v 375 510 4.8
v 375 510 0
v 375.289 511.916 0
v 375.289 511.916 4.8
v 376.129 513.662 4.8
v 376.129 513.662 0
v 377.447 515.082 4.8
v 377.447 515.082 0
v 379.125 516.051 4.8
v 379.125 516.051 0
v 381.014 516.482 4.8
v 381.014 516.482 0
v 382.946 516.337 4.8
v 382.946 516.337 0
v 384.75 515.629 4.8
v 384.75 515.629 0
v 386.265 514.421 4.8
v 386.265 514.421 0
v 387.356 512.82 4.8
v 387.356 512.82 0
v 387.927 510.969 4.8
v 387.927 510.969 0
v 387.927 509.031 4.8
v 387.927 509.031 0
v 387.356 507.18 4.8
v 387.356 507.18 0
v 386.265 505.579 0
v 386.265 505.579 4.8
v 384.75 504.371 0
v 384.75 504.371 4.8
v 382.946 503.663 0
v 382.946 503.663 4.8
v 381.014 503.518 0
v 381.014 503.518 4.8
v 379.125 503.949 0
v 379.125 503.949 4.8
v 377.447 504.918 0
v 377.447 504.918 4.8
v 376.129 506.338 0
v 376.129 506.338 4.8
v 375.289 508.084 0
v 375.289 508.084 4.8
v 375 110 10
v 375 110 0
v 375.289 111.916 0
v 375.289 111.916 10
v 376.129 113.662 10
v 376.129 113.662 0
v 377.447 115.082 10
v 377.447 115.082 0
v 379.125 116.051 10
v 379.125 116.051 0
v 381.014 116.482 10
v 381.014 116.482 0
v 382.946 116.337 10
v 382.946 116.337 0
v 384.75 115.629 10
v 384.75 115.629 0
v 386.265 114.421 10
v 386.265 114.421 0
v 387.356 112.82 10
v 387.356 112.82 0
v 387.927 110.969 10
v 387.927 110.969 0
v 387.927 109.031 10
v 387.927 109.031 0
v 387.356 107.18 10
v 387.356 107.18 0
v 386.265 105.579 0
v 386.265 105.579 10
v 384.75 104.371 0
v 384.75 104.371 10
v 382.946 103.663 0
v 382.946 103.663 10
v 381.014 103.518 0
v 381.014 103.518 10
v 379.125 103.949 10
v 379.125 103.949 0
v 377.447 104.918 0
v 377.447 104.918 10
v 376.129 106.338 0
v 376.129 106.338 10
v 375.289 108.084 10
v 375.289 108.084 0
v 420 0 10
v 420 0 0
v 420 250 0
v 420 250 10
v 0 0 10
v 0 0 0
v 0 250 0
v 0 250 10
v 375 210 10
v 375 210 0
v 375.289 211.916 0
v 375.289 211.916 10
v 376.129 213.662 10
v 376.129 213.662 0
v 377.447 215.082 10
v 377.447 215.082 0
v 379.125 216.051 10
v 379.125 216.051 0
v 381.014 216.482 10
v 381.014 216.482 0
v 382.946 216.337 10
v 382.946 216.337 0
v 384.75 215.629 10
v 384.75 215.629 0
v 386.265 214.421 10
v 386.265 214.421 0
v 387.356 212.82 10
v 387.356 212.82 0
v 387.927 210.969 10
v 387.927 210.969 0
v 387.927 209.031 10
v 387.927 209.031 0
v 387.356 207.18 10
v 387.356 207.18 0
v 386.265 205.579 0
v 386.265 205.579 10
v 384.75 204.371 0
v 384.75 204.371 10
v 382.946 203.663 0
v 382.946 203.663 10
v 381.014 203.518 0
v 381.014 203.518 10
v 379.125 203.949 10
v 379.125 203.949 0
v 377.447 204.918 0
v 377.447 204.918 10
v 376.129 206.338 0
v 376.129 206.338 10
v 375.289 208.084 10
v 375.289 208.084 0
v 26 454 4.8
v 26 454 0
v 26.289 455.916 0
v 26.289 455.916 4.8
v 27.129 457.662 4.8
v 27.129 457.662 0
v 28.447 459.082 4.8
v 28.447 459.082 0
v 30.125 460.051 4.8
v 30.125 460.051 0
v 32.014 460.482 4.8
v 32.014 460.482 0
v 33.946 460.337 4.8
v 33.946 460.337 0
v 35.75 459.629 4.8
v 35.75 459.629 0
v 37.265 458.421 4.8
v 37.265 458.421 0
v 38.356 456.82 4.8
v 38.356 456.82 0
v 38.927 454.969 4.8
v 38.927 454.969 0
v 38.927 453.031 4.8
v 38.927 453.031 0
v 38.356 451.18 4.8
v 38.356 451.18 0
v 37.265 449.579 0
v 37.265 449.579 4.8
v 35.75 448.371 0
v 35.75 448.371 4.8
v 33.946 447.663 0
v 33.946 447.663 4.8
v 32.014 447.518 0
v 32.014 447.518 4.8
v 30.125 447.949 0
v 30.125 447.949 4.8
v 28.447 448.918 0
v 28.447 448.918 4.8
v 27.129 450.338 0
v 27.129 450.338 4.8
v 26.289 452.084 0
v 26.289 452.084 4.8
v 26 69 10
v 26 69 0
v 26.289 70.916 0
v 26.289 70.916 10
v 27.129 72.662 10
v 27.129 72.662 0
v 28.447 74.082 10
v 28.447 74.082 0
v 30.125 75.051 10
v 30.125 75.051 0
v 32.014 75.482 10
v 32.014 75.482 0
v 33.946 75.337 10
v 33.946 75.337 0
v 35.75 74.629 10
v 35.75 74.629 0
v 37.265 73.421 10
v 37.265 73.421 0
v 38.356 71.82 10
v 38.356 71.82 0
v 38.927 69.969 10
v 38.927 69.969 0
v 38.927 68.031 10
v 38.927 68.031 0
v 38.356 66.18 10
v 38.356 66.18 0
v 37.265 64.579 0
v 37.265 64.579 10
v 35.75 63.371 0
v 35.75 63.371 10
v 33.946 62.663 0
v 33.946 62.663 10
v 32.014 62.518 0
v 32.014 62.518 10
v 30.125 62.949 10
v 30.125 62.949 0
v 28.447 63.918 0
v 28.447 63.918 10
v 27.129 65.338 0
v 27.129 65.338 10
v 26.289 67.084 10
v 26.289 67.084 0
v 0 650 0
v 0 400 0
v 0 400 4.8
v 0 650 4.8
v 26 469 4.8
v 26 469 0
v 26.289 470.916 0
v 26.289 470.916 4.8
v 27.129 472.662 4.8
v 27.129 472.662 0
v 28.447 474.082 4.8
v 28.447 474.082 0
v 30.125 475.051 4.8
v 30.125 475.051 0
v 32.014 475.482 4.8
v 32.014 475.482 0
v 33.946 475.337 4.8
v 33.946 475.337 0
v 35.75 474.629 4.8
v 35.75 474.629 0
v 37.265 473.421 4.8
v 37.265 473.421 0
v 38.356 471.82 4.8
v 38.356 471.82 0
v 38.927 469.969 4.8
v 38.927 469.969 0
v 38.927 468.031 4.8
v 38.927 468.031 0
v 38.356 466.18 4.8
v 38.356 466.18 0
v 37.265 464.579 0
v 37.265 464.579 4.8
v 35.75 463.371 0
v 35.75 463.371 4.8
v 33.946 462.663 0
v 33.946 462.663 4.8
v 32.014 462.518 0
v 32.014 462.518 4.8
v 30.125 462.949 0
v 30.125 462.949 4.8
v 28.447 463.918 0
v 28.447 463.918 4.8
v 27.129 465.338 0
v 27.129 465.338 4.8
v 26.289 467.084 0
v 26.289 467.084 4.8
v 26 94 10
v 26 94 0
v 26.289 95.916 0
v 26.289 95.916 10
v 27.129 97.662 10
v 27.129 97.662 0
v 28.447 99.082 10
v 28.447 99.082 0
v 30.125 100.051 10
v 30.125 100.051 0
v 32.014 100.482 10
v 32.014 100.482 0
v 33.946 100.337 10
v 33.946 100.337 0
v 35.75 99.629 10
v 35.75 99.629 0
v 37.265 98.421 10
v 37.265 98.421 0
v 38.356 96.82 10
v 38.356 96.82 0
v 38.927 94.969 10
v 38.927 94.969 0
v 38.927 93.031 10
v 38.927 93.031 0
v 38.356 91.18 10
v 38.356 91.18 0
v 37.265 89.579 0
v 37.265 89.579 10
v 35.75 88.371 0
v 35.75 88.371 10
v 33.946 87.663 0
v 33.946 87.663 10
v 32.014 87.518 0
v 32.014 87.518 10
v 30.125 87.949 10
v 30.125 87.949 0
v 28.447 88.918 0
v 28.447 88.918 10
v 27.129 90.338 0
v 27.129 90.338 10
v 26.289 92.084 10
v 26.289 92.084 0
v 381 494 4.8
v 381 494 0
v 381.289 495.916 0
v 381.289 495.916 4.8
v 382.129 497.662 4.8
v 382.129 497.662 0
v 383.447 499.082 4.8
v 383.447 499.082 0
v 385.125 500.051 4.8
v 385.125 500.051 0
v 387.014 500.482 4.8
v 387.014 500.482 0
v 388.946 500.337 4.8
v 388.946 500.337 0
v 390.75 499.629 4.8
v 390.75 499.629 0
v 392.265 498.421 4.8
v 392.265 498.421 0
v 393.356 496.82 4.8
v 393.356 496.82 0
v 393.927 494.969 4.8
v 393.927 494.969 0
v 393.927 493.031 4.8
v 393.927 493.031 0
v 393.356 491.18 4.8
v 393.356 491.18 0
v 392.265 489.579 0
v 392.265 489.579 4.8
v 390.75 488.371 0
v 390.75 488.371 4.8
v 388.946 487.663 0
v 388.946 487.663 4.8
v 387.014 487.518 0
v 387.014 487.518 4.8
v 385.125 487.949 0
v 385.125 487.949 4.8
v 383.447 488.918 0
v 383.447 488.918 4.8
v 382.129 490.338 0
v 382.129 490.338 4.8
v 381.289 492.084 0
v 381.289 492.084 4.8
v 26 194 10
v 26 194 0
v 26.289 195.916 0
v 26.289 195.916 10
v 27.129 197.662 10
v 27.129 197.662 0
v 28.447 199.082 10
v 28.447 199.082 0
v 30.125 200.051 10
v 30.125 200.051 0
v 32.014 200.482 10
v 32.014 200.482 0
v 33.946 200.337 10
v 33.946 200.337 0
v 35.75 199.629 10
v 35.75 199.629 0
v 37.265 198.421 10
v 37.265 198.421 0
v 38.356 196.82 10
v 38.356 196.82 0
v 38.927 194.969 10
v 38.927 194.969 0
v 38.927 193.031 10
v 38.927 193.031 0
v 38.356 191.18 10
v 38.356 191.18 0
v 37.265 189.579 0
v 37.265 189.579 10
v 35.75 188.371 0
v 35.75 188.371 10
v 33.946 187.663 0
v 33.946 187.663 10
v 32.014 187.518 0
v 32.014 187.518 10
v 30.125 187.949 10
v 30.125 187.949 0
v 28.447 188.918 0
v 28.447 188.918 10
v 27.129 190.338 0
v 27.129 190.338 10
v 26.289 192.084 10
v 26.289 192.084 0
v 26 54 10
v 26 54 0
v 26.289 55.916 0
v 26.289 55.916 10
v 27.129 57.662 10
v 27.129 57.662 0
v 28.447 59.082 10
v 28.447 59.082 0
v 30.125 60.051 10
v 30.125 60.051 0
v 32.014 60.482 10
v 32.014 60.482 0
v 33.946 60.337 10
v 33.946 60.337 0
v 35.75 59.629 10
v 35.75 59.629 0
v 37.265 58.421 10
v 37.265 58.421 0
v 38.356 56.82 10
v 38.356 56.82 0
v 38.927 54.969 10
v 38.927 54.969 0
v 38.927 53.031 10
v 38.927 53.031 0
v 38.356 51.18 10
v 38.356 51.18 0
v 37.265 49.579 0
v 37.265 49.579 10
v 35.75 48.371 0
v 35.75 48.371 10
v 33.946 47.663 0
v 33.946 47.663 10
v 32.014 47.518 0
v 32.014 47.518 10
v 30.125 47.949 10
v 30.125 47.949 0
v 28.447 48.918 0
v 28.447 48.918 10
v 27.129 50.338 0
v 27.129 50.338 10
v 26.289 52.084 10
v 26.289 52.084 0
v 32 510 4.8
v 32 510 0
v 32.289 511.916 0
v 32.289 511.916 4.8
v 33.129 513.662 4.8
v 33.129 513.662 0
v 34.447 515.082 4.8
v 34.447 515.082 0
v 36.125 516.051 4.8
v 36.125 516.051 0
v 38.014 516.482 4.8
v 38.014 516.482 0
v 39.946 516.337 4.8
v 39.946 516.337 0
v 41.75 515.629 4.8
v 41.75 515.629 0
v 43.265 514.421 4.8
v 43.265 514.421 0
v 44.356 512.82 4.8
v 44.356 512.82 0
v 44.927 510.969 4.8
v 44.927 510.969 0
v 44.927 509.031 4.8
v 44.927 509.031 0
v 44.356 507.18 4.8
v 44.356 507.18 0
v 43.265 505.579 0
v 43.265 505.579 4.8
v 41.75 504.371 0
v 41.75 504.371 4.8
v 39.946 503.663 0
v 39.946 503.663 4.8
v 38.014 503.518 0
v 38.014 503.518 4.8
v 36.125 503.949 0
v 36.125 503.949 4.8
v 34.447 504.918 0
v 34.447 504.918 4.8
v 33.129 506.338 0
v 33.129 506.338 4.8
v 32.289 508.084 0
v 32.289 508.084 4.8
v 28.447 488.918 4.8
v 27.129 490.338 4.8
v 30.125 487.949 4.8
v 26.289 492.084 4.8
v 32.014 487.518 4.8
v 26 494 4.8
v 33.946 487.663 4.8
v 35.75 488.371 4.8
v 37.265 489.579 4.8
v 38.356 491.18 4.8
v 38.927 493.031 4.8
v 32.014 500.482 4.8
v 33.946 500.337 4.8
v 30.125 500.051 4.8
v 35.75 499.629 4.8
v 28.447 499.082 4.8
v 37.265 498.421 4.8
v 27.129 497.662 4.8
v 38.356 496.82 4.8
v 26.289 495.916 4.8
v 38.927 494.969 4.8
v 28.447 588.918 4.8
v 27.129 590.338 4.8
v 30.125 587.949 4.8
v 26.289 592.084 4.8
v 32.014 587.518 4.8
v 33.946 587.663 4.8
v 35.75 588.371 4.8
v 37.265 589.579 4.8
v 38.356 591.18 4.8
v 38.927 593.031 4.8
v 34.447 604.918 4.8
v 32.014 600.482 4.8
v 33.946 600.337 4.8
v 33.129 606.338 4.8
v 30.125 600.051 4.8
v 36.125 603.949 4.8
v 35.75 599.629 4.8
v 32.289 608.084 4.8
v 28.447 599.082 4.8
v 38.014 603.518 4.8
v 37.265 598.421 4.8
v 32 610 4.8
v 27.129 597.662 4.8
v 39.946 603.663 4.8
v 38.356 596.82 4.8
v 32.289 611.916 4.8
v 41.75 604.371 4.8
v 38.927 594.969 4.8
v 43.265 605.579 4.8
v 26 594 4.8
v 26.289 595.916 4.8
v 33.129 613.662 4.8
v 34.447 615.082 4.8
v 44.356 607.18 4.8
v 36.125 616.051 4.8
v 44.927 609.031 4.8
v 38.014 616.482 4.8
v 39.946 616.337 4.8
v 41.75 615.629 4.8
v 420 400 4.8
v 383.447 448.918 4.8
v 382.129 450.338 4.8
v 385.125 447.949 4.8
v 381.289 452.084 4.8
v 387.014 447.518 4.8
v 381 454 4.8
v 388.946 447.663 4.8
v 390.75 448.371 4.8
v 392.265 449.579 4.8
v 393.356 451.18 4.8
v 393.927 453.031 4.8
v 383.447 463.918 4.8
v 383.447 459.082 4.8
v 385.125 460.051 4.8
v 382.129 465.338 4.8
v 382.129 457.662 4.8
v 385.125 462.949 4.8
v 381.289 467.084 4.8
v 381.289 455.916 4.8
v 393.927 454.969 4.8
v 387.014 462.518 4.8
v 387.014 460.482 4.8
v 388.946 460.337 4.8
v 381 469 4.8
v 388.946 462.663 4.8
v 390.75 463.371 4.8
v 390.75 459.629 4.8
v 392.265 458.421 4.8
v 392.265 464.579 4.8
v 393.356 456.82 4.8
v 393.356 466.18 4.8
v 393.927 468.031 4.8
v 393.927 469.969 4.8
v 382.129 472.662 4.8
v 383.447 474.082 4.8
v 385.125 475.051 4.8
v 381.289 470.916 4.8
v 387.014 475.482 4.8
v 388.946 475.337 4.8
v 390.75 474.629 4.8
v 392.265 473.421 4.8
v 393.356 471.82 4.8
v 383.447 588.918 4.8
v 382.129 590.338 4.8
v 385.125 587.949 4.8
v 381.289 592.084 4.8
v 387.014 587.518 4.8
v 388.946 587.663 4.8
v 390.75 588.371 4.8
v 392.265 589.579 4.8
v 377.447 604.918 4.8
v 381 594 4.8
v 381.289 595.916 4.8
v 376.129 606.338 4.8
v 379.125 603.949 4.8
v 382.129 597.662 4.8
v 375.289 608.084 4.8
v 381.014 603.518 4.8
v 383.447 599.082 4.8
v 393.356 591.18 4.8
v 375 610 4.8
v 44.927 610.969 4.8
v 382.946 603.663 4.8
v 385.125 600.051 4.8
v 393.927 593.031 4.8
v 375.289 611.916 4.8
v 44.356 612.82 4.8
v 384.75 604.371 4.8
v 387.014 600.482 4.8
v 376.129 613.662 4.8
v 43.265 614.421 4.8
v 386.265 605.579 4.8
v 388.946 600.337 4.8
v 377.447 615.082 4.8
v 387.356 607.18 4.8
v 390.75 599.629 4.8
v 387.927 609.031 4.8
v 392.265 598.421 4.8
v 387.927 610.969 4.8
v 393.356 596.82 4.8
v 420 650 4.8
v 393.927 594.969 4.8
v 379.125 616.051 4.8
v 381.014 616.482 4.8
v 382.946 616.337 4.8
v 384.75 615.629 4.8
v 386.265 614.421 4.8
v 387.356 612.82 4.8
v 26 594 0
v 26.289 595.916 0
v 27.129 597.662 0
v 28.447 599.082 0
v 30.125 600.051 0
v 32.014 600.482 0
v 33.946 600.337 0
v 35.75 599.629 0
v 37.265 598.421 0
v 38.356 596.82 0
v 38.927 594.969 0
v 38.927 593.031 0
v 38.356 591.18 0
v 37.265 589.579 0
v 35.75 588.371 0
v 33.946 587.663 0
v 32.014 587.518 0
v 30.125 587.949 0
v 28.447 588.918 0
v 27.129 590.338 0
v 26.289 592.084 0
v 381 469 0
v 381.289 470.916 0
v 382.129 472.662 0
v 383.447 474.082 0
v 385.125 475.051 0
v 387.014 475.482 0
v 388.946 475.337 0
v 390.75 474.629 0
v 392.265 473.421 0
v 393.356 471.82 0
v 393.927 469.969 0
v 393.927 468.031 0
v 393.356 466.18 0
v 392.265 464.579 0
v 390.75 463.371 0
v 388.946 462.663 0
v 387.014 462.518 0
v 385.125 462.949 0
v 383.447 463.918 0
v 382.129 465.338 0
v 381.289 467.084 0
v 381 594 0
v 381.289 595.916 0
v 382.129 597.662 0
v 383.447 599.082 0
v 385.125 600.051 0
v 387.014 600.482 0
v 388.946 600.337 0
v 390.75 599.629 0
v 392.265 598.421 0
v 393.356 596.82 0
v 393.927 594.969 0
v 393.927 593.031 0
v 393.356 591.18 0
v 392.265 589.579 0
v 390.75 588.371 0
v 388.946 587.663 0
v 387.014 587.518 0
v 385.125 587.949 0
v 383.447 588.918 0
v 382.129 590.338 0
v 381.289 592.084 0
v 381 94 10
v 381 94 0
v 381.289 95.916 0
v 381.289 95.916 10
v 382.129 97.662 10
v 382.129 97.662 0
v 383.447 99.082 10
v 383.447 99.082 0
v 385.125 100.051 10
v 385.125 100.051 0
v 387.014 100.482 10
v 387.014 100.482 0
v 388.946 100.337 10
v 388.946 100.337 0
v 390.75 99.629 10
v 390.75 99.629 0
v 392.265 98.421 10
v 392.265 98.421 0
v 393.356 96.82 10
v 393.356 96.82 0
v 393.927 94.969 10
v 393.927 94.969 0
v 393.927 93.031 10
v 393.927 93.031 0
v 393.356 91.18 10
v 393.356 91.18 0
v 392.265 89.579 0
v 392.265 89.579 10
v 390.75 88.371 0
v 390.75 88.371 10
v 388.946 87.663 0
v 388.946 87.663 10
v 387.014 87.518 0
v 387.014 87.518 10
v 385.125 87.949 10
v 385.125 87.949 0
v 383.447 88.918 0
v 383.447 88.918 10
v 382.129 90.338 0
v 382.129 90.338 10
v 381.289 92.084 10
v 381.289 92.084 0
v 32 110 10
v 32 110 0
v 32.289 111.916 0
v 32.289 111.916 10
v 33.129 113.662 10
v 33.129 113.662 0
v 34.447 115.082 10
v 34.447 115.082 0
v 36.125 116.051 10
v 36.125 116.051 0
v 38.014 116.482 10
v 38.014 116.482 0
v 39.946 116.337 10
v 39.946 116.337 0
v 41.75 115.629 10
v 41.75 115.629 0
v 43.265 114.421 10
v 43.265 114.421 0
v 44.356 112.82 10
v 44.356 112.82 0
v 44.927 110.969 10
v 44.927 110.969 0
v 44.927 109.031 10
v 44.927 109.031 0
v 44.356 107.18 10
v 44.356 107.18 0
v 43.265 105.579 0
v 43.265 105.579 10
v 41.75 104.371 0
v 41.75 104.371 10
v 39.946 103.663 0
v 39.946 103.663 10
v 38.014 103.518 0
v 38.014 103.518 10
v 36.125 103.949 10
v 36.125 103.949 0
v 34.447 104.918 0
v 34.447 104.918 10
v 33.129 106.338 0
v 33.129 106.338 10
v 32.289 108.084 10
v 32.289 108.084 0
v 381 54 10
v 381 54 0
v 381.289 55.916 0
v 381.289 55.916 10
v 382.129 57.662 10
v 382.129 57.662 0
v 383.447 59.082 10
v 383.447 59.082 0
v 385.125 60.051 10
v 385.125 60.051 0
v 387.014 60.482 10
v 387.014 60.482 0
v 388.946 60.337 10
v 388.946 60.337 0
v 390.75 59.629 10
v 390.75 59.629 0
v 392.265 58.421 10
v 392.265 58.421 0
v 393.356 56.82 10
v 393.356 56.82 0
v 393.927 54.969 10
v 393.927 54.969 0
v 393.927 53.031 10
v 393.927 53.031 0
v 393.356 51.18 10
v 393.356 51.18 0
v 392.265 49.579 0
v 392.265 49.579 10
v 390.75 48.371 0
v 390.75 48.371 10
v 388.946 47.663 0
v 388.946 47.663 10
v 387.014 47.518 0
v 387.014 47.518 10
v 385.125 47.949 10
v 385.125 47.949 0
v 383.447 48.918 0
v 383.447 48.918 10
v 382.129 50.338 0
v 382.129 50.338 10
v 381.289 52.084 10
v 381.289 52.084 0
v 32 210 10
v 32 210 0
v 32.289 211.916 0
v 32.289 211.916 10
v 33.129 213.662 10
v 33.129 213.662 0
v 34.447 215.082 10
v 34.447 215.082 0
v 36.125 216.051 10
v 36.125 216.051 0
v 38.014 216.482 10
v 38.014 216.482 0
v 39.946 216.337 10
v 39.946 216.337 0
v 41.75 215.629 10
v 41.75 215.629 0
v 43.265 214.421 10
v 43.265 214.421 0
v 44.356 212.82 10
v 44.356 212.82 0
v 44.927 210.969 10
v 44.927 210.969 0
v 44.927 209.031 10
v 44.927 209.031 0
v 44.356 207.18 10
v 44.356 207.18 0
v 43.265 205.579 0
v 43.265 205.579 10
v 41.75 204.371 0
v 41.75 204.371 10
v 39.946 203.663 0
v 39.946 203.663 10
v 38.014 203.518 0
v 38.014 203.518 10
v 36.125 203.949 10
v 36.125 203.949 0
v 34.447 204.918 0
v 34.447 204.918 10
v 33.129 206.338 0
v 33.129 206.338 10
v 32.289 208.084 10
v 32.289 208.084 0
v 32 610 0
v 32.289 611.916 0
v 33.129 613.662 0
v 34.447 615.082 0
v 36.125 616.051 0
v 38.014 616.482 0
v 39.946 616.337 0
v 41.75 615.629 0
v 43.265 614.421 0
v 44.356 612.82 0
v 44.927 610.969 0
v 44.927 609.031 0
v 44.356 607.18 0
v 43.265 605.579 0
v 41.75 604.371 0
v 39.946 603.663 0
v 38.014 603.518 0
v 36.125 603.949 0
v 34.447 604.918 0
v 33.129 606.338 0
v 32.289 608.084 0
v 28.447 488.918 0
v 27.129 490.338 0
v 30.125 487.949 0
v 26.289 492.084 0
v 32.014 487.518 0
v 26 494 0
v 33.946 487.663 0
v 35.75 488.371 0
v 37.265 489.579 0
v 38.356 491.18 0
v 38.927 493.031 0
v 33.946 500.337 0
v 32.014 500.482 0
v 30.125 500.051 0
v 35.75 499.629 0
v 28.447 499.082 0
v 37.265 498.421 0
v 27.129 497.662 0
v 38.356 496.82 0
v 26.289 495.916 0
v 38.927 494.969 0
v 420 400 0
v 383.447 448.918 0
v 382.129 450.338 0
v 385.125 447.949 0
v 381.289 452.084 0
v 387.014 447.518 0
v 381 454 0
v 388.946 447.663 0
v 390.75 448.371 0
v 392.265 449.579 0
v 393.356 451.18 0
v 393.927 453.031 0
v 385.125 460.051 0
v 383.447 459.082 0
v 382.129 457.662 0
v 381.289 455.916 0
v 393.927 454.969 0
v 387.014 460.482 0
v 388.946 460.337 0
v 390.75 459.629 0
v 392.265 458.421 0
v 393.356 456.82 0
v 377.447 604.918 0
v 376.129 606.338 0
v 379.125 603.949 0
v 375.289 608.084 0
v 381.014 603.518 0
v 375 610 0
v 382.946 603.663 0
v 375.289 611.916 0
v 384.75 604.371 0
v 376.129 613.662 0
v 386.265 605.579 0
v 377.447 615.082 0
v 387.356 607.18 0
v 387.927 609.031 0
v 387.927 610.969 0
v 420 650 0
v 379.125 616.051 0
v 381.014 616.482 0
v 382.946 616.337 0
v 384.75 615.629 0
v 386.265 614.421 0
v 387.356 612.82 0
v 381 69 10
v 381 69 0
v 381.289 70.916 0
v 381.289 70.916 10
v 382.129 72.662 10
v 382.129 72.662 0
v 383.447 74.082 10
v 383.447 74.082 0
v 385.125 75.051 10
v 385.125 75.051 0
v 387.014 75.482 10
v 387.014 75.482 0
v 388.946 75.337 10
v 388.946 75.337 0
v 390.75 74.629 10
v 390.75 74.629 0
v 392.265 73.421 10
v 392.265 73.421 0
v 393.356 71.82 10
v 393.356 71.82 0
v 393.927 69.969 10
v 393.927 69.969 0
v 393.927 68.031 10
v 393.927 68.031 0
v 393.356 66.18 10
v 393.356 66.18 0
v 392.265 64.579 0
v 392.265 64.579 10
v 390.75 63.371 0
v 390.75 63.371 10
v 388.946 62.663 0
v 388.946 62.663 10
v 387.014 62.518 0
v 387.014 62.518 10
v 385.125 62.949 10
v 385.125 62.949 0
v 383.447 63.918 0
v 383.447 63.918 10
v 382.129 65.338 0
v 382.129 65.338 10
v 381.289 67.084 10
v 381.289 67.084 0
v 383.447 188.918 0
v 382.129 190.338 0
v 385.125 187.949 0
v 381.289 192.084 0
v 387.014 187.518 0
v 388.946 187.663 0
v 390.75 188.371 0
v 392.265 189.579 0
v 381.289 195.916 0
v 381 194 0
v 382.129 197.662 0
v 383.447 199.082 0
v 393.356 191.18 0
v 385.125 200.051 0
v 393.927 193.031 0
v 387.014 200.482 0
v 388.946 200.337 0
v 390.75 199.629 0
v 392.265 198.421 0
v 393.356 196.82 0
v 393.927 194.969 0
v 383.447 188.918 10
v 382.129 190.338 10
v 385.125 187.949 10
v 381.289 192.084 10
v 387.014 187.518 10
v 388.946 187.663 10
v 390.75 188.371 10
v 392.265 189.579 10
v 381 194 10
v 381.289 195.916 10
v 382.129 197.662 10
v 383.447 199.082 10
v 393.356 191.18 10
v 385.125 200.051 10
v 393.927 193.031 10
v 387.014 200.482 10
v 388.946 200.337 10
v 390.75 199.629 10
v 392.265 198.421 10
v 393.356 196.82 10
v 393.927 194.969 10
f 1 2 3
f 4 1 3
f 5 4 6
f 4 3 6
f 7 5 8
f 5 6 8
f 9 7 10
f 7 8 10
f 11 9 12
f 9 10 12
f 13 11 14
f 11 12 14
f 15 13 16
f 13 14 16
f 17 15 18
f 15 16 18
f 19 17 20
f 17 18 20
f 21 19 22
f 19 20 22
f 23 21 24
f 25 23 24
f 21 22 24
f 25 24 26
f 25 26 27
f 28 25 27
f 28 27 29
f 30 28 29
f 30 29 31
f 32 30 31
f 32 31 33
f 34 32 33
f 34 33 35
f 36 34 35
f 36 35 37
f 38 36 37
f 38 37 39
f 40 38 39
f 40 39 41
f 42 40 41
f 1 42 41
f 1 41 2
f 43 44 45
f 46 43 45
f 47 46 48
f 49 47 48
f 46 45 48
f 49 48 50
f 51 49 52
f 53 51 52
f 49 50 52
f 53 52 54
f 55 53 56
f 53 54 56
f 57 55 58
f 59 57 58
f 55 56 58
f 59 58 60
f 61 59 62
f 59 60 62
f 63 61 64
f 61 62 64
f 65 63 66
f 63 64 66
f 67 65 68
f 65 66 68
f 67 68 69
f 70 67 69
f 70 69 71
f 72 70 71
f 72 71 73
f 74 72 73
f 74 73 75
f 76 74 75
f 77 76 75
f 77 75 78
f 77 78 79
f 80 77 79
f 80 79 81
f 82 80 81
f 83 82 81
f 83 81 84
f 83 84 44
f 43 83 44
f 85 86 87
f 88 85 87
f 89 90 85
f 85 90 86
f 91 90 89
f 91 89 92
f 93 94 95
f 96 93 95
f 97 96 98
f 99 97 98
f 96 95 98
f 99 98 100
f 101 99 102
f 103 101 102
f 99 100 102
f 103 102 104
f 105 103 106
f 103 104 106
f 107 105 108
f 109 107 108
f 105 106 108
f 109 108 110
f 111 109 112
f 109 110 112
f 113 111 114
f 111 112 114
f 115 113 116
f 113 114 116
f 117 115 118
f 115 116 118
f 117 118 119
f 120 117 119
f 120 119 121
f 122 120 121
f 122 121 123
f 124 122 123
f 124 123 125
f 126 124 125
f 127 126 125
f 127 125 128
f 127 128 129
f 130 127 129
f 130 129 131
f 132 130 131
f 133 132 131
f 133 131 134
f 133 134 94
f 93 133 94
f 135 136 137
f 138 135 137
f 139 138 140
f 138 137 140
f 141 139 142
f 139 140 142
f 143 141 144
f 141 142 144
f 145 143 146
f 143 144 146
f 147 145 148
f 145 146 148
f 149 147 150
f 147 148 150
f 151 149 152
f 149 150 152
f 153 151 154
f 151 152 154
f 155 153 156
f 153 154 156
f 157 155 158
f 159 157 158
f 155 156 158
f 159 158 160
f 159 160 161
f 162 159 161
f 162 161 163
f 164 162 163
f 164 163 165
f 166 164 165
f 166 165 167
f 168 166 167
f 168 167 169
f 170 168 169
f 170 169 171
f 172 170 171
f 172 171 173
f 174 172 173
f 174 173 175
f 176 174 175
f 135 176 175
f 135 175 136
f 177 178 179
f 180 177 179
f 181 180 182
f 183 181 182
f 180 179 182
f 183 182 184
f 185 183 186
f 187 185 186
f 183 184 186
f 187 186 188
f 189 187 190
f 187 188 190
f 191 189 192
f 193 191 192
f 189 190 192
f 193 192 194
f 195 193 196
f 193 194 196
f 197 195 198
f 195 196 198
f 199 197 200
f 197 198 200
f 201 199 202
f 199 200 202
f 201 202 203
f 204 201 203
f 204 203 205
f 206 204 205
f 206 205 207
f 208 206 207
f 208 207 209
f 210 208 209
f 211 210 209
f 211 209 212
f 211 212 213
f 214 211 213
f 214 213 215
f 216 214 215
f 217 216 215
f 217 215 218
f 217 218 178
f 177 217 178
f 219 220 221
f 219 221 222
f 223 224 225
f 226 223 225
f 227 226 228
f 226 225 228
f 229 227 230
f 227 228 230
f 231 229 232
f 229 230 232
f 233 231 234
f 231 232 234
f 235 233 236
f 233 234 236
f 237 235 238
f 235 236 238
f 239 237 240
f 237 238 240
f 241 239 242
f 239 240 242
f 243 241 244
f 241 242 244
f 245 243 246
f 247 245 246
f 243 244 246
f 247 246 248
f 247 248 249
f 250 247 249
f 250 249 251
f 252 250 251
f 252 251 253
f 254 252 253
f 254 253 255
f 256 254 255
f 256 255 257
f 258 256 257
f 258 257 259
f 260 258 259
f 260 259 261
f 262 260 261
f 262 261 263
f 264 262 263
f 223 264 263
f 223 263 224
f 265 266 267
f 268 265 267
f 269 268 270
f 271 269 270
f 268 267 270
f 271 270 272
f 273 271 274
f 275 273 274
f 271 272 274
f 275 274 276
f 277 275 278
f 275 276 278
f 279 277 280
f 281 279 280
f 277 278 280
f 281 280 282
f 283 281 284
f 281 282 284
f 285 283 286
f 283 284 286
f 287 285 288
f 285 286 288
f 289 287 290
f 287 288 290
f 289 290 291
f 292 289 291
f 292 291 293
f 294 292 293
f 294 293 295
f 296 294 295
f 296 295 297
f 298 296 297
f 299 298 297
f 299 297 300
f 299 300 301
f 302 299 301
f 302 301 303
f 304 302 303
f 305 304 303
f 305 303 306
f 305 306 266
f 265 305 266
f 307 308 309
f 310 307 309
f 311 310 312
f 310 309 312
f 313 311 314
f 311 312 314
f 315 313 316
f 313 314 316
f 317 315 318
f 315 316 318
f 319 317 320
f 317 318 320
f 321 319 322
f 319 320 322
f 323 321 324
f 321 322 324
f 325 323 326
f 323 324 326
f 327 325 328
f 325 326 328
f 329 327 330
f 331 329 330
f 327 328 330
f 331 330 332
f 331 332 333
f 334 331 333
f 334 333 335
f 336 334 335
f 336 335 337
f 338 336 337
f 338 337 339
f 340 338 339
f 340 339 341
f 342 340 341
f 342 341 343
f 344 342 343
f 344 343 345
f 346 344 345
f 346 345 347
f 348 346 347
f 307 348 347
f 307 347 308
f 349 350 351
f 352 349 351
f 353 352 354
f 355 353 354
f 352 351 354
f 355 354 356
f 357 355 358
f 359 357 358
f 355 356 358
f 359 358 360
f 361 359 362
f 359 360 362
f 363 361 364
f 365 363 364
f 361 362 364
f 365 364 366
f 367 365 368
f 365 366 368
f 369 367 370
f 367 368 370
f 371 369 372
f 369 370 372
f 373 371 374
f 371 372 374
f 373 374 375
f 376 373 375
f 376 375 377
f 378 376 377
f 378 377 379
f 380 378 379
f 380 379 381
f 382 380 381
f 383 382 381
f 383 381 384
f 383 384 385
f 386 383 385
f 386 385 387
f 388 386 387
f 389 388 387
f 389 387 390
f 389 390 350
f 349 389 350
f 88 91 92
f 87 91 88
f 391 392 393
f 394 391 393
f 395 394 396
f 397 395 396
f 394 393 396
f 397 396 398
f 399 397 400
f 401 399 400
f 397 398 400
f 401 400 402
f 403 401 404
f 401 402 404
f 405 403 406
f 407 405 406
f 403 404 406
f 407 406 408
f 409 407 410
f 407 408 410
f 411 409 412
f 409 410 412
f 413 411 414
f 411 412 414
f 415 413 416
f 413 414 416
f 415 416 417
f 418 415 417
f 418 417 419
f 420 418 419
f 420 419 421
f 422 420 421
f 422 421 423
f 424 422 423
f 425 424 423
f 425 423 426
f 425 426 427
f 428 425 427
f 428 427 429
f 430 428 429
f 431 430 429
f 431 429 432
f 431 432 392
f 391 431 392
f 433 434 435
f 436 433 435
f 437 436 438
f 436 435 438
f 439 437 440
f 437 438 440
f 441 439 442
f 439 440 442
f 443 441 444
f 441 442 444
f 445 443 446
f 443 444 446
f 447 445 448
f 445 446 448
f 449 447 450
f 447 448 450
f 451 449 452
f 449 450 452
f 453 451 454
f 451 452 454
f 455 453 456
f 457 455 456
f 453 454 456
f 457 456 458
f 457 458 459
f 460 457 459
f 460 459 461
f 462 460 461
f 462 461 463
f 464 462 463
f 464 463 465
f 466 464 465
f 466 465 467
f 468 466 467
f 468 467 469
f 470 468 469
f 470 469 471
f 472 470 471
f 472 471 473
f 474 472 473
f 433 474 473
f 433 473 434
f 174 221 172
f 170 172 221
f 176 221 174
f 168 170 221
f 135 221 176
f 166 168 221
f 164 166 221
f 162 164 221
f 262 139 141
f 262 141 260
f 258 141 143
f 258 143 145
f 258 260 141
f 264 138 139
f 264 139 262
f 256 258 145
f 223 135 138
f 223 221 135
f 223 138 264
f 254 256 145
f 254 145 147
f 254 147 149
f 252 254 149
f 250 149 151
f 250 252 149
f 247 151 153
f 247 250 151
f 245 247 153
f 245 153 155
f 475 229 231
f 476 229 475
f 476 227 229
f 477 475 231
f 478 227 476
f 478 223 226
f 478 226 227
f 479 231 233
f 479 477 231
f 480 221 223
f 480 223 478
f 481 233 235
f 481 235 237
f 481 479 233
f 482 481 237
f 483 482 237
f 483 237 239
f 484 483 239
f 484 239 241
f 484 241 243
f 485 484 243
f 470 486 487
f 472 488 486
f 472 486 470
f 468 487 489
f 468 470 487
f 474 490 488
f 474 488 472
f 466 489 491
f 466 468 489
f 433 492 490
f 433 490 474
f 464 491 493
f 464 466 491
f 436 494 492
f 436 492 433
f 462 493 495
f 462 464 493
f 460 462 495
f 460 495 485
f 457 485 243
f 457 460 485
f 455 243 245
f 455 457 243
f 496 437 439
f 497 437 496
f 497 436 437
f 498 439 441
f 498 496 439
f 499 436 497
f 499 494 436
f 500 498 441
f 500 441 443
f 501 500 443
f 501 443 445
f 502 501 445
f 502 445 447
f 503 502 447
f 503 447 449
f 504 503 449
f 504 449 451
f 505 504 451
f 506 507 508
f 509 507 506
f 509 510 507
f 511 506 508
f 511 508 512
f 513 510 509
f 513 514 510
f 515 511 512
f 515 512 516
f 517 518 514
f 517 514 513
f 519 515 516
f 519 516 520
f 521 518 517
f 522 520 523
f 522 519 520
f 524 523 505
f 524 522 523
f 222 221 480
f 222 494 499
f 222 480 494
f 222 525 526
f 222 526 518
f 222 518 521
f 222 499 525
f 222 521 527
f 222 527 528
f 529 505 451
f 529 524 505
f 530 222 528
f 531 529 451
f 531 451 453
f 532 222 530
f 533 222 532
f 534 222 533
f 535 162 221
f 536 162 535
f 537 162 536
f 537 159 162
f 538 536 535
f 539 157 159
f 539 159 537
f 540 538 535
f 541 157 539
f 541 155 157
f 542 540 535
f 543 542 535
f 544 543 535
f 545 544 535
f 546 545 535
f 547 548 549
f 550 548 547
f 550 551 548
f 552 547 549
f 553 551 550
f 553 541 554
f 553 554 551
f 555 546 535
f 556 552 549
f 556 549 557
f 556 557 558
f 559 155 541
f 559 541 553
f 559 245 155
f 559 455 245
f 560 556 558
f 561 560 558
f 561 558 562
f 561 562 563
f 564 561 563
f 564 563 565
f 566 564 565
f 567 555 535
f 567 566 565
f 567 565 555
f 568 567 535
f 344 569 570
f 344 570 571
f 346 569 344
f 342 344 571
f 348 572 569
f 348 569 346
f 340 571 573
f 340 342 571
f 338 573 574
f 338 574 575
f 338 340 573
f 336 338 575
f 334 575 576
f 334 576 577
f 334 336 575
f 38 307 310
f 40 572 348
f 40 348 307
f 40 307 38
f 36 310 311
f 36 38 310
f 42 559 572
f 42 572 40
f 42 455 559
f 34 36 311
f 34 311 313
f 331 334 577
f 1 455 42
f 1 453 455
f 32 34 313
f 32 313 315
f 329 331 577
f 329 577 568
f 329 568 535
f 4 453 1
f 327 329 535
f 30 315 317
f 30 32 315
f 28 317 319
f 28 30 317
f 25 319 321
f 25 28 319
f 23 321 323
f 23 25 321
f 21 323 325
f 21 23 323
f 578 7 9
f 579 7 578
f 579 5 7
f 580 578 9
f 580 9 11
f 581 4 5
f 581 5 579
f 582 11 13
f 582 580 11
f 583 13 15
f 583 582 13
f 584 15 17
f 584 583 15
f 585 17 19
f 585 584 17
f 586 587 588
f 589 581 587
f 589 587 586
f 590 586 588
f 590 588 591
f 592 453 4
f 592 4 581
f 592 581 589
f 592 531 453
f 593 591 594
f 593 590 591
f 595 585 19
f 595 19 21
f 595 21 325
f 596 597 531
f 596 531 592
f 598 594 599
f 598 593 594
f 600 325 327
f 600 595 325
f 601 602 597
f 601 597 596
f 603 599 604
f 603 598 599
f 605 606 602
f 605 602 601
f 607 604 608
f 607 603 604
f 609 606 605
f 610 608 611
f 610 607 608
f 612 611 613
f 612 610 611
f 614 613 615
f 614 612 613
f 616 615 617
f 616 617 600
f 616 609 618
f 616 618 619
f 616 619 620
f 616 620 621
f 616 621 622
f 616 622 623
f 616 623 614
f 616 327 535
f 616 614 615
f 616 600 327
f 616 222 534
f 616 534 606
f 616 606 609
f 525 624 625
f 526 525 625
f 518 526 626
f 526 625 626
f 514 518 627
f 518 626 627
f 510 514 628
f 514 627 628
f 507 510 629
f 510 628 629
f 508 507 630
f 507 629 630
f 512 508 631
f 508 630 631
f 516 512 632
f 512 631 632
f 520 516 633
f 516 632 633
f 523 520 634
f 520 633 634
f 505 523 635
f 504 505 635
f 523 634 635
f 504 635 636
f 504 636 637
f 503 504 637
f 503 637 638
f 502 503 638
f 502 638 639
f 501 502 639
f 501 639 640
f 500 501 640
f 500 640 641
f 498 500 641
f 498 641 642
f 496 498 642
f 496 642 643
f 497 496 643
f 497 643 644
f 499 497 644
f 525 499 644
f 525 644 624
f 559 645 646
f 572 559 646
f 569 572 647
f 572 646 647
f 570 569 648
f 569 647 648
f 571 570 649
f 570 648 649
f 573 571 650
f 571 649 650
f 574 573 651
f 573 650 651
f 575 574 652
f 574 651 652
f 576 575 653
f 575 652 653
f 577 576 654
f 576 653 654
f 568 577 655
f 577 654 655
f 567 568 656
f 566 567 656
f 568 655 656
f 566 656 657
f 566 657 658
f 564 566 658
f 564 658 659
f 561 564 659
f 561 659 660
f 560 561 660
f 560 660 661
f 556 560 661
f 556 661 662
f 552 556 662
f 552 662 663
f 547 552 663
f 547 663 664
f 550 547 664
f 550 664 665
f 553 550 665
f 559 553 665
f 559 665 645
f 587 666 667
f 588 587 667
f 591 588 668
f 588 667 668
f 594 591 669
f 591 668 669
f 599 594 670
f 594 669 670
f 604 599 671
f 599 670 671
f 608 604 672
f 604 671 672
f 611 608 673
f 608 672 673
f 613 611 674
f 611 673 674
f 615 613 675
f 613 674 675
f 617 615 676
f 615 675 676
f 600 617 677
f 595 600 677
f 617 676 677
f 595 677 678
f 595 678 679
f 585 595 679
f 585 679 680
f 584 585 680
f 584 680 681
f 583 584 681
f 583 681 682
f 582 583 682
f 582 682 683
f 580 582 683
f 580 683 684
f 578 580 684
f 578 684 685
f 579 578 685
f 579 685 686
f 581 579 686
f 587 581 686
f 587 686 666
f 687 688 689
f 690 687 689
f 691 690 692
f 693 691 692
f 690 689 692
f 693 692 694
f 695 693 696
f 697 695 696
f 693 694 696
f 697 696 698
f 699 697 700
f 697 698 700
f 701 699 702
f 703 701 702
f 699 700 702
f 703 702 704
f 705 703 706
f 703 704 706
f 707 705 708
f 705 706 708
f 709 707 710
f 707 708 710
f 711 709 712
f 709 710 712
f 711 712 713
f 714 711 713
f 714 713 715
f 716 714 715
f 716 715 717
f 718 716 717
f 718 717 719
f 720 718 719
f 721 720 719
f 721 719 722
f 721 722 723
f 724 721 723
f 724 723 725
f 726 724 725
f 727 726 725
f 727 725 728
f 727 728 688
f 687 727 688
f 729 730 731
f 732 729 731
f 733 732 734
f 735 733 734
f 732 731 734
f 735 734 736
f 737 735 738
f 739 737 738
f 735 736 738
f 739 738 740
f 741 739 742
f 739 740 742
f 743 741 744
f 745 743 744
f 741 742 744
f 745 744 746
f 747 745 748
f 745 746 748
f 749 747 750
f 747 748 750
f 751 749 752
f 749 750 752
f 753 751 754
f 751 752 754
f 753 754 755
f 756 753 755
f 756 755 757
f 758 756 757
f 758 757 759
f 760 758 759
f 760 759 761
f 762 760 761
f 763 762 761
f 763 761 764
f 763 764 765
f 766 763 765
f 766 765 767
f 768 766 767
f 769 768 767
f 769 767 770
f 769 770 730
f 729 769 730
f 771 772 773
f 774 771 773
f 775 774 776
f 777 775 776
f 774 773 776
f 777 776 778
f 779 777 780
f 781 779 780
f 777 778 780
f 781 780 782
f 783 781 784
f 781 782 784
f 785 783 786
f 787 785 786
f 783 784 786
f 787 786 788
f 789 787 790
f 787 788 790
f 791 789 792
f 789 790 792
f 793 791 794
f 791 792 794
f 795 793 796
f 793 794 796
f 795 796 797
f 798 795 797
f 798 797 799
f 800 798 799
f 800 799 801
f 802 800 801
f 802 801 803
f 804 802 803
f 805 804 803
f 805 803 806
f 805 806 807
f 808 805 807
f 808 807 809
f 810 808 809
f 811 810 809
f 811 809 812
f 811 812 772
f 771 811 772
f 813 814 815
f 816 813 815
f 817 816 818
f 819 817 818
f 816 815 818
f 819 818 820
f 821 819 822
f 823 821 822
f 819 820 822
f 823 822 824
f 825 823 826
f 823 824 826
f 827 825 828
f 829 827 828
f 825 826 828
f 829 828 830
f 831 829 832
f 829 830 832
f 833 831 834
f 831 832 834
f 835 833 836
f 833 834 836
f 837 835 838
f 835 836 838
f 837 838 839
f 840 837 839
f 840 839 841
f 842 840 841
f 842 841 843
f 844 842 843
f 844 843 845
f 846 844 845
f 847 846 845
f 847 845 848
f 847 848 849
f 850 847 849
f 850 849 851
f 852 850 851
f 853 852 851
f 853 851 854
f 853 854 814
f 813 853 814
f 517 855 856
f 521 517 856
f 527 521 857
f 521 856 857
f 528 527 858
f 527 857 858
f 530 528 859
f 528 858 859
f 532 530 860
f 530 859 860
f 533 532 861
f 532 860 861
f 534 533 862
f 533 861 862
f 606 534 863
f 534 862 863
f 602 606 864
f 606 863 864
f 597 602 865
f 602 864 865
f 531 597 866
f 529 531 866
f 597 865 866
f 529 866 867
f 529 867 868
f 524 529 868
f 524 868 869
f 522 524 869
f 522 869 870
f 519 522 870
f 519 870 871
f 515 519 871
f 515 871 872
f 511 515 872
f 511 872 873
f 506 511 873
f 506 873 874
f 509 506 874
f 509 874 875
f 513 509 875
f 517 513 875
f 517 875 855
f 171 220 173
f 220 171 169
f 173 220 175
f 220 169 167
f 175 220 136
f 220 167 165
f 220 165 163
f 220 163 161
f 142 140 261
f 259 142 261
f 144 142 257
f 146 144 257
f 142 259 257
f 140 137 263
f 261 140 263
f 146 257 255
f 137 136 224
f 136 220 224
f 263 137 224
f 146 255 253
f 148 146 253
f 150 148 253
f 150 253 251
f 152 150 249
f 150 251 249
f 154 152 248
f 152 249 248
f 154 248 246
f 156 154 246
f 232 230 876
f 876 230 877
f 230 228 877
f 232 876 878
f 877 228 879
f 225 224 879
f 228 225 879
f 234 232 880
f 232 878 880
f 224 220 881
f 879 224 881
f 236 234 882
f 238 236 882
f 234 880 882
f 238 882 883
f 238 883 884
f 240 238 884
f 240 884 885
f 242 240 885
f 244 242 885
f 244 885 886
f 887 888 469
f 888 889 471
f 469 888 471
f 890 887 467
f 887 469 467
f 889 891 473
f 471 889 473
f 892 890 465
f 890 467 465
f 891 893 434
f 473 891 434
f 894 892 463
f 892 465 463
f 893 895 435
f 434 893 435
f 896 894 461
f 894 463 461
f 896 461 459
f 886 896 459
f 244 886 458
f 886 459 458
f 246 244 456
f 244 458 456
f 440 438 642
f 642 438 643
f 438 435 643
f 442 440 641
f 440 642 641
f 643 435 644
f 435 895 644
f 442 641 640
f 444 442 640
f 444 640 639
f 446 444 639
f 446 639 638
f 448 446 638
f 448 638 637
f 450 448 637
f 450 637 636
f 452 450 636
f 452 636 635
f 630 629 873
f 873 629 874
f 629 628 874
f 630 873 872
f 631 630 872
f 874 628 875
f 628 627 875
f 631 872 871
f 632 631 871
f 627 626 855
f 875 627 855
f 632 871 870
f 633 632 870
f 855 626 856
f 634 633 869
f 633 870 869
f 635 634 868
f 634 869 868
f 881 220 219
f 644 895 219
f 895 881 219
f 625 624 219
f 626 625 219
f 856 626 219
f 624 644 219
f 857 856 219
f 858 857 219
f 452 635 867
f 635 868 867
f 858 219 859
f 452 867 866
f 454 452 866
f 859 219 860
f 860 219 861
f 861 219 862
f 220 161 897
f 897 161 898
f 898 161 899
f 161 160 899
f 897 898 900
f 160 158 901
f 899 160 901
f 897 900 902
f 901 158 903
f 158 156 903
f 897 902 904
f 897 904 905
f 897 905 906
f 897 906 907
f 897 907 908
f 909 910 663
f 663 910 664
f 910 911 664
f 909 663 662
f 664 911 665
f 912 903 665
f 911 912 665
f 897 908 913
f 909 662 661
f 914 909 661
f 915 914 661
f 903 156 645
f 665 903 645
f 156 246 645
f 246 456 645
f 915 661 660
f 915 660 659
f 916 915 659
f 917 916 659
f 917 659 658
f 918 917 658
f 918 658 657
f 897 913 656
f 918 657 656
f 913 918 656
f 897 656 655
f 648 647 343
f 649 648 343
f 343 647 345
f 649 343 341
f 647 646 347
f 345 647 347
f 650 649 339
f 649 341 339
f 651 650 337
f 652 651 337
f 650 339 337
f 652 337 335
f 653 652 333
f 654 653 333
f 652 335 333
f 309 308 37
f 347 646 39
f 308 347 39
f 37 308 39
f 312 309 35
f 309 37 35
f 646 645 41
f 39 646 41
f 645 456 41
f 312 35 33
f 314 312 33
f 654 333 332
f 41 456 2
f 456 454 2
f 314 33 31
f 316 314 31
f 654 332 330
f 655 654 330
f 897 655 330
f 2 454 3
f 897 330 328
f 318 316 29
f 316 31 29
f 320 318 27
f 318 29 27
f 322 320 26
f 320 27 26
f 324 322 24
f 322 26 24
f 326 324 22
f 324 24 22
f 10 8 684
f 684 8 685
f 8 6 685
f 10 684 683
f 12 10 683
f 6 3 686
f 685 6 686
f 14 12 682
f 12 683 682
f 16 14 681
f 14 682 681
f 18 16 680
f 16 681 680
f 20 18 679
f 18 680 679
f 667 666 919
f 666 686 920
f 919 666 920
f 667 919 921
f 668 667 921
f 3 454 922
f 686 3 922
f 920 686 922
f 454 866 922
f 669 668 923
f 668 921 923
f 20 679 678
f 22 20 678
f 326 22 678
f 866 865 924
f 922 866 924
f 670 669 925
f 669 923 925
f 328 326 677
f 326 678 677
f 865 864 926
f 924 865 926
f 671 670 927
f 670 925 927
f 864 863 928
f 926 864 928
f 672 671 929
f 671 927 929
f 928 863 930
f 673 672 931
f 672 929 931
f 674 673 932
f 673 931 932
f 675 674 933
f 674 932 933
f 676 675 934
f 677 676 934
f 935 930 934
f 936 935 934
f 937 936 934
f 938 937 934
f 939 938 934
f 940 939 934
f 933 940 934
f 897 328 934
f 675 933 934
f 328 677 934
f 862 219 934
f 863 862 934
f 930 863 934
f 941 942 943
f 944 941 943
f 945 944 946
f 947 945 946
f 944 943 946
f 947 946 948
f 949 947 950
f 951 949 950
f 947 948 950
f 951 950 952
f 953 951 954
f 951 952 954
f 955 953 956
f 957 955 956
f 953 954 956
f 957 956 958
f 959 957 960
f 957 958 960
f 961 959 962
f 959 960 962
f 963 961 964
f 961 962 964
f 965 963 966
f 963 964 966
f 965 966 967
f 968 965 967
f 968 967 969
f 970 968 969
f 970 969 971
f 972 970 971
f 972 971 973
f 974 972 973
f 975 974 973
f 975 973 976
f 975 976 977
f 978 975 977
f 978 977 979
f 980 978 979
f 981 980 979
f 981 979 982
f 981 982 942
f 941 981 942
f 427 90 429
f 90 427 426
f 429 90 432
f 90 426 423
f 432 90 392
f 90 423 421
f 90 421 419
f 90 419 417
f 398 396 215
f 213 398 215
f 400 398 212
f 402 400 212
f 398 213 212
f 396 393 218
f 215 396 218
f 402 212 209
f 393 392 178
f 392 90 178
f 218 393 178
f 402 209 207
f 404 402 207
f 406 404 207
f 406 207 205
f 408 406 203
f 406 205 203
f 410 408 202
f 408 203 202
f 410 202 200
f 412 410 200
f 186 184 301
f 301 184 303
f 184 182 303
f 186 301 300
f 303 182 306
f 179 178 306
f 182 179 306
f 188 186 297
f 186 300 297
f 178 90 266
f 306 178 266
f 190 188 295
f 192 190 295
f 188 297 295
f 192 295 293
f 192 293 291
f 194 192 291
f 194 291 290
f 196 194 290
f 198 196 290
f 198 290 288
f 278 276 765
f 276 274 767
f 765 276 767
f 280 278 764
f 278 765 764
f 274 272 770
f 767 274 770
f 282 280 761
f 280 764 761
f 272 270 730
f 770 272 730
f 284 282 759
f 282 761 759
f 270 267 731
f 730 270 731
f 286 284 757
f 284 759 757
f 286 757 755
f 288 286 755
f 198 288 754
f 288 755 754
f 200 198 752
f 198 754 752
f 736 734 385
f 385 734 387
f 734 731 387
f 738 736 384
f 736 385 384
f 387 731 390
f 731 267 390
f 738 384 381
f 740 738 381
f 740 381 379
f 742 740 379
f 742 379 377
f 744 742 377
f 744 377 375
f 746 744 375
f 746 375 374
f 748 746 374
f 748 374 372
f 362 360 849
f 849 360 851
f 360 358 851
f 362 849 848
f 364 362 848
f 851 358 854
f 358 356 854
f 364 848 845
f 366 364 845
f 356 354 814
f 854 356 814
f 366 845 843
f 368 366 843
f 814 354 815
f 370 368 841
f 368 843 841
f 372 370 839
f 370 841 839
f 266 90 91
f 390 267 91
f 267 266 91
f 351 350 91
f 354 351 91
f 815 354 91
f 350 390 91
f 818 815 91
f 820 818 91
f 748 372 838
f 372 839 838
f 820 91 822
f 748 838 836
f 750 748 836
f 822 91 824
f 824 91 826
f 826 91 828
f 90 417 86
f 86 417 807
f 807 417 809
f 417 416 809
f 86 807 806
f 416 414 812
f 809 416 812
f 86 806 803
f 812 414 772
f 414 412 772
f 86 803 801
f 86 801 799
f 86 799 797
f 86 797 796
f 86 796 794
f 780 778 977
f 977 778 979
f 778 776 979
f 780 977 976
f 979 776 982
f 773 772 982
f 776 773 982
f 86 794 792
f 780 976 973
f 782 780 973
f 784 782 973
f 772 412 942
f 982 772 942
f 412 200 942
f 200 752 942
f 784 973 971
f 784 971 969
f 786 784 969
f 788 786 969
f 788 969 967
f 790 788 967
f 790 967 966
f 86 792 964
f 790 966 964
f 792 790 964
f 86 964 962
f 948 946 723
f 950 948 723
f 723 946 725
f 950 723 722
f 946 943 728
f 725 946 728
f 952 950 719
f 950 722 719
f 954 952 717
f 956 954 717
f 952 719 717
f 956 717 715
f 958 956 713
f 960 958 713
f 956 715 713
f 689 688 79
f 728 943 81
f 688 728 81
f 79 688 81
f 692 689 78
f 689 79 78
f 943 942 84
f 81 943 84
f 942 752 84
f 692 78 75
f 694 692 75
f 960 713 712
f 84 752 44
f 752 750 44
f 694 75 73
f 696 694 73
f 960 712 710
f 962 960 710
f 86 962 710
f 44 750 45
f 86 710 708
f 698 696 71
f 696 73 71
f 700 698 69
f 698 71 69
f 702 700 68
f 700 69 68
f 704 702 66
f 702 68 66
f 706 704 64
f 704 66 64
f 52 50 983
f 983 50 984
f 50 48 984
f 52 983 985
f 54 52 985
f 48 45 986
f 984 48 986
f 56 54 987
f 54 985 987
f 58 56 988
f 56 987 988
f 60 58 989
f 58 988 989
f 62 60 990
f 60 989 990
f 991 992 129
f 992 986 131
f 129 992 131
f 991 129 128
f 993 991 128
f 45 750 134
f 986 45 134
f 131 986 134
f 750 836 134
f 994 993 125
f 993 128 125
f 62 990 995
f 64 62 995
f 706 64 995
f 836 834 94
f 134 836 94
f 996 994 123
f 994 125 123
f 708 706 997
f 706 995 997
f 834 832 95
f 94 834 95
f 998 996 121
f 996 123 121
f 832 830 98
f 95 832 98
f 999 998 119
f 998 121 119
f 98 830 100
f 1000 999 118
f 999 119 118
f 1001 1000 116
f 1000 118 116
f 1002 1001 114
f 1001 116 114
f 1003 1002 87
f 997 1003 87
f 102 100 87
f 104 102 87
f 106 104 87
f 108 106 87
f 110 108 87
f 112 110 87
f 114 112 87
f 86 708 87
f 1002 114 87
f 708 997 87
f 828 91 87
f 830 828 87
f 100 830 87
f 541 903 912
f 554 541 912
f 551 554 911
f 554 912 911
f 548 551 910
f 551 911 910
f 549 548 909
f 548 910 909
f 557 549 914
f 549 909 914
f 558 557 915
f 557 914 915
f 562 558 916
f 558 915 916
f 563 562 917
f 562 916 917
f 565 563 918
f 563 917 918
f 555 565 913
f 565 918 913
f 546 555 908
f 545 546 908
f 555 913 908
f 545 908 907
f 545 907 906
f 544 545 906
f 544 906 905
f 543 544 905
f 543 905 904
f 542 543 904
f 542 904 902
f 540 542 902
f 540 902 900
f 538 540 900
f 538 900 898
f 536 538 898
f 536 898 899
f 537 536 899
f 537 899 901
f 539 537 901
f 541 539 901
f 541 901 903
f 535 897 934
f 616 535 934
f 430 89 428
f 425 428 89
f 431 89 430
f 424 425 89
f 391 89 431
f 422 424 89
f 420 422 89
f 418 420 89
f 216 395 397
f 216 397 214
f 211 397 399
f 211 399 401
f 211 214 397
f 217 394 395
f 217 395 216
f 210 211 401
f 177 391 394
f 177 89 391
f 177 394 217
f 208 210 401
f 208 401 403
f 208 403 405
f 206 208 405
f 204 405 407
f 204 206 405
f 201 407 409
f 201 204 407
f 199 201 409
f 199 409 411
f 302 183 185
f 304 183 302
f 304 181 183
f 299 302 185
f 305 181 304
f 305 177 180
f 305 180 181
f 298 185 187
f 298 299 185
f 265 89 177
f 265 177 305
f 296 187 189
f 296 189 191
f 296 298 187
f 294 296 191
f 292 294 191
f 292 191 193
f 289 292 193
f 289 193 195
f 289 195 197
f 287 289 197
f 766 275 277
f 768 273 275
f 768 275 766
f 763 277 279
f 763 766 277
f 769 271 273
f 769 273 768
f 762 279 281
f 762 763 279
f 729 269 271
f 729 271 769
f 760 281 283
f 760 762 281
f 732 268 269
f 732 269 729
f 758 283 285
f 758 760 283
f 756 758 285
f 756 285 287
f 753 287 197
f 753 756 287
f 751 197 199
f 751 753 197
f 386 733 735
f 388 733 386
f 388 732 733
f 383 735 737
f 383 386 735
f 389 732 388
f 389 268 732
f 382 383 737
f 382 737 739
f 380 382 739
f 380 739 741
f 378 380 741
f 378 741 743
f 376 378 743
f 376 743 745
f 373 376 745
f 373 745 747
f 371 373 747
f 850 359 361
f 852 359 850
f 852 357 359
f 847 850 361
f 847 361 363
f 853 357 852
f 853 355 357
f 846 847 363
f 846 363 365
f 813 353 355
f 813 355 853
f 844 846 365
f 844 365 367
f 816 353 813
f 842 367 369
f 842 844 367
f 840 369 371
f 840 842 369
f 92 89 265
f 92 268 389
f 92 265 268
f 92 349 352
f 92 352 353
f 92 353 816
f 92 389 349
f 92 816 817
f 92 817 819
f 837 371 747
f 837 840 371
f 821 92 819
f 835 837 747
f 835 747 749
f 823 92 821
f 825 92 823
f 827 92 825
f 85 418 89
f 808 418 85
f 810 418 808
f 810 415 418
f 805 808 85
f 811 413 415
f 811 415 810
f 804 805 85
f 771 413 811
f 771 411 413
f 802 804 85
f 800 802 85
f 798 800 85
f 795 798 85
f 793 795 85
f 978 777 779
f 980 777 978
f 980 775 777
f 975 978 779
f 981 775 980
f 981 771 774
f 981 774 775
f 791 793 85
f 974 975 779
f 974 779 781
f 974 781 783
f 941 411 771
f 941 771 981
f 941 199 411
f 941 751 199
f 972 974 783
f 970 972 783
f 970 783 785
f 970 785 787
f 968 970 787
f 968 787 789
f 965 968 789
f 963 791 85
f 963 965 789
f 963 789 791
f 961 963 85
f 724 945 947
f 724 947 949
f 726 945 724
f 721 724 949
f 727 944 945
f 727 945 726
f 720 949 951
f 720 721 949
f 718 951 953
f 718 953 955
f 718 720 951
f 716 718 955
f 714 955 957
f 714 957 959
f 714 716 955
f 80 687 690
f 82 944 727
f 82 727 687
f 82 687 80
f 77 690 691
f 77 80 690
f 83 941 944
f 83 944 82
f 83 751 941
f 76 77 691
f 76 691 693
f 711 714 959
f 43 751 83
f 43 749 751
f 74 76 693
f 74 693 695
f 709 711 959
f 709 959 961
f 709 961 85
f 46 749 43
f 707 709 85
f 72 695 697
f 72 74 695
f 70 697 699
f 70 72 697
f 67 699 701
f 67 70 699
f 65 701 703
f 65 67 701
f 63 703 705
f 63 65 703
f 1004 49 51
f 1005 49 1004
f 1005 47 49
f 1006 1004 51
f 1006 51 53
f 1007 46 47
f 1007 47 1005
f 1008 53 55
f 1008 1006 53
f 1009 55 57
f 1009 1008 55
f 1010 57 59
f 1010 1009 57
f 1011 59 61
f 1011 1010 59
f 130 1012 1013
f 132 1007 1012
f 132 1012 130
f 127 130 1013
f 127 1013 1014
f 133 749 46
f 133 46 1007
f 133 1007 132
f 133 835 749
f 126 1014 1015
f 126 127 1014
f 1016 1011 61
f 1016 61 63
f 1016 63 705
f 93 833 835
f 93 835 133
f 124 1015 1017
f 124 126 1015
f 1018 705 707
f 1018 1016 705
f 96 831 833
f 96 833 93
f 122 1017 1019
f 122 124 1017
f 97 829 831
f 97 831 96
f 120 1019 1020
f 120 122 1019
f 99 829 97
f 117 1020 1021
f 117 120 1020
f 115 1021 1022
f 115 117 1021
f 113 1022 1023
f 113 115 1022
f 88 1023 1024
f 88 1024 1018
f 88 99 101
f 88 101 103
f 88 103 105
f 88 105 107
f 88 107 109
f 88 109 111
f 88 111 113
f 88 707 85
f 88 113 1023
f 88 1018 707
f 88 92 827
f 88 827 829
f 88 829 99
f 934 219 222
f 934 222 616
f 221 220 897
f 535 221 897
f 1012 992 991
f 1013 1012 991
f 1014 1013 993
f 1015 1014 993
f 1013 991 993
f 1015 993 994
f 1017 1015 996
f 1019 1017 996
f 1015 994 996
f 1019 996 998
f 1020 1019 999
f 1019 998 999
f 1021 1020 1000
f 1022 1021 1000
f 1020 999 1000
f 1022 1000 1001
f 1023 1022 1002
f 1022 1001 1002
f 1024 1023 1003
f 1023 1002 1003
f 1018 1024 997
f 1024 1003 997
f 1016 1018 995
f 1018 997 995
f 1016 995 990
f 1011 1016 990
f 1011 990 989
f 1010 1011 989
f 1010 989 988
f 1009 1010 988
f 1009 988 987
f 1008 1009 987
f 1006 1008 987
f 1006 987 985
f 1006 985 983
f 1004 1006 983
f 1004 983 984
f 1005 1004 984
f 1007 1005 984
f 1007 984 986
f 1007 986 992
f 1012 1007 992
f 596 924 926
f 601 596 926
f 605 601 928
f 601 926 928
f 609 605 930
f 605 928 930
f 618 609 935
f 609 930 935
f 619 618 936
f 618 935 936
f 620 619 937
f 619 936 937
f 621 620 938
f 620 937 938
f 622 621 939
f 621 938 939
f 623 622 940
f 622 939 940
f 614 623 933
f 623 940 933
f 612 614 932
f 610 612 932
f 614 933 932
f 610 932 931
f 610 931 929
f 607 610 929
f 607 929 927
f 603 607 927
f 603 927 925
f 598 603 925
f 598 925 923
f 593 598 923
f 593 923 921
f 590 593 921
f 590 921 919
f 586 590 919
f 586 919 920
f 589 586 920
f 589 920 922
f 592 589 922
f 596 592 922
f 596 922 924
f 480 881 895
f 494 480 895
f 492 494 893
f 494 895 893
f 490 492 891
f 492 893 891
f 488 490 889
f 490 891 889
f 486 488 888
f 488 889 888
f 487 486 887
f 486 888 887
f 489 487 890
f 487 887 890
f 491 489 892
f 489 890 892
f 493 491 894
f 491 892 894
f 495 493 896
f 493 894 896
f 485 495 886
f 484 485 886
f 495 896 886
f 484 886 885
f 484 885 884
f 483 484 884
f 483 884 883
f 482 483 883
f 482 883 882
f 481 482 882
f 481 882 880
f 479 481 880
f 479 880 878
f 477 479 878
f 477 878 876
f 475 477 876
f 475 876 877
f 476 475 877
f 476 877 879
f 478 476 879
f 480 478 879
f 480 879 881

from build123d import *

# Parameters (mm, degrees)
F0_W      = 420
F0_H      = 250
F1_DEPTH  = 10
F3_D      = 13
F5_D      = 13
F7_D      = 13
F9_W      = 420
F9_H      = 250
F10_DEPTH = 5.2


with BuildPart() as f1:
    # F0 (on Top) → F1 (new body)
    with BuildSketch(Plane.XY):
        with Locations((210, 125)):
            Rectangle(F0_W, F0_H)
    extrude(amount=F1_DEPTH)

    # F3 (through all)
    with Locations(Plane.XY.offset(10)):
        with Locations((38.5, 210), (381.5, 210), (381.5, 110), (38.5, 110)):
            Hole(F3_D / 2)

    # F5 (through all)
    with Locations(Plane.XY.offset(10)):
        with Locations((32.5, 194), (387.5, 194), (387.5, 94), (387.5, 69), (32.5, 69), (32.5, 94)):
            Hole(F5_D / 2)

    # F7 (through all)
    with Locations(Plane.XY.offset(10)):
        with Locations((32.5, 194), (387.5, 194), (387.5, 54), (32.5, 54)):
            Hole(F7_D / 2)


with BuildPart() as f8_1:
    # F8: copy of F1
    add(f1.part.moved(Location((0, 400, 0))))

    # F9 (on face) → F10 (cut)
    with BuildSketch(Plane.XY.offset(10)):
        with Locations((210, 525)):
            Rectangle(F9_W, F9_H)
    extrude(amount=-F10_DEPTH, mode=Mode.SUBTRACT)


solid = Compound([f1.part, f8_1.part])
